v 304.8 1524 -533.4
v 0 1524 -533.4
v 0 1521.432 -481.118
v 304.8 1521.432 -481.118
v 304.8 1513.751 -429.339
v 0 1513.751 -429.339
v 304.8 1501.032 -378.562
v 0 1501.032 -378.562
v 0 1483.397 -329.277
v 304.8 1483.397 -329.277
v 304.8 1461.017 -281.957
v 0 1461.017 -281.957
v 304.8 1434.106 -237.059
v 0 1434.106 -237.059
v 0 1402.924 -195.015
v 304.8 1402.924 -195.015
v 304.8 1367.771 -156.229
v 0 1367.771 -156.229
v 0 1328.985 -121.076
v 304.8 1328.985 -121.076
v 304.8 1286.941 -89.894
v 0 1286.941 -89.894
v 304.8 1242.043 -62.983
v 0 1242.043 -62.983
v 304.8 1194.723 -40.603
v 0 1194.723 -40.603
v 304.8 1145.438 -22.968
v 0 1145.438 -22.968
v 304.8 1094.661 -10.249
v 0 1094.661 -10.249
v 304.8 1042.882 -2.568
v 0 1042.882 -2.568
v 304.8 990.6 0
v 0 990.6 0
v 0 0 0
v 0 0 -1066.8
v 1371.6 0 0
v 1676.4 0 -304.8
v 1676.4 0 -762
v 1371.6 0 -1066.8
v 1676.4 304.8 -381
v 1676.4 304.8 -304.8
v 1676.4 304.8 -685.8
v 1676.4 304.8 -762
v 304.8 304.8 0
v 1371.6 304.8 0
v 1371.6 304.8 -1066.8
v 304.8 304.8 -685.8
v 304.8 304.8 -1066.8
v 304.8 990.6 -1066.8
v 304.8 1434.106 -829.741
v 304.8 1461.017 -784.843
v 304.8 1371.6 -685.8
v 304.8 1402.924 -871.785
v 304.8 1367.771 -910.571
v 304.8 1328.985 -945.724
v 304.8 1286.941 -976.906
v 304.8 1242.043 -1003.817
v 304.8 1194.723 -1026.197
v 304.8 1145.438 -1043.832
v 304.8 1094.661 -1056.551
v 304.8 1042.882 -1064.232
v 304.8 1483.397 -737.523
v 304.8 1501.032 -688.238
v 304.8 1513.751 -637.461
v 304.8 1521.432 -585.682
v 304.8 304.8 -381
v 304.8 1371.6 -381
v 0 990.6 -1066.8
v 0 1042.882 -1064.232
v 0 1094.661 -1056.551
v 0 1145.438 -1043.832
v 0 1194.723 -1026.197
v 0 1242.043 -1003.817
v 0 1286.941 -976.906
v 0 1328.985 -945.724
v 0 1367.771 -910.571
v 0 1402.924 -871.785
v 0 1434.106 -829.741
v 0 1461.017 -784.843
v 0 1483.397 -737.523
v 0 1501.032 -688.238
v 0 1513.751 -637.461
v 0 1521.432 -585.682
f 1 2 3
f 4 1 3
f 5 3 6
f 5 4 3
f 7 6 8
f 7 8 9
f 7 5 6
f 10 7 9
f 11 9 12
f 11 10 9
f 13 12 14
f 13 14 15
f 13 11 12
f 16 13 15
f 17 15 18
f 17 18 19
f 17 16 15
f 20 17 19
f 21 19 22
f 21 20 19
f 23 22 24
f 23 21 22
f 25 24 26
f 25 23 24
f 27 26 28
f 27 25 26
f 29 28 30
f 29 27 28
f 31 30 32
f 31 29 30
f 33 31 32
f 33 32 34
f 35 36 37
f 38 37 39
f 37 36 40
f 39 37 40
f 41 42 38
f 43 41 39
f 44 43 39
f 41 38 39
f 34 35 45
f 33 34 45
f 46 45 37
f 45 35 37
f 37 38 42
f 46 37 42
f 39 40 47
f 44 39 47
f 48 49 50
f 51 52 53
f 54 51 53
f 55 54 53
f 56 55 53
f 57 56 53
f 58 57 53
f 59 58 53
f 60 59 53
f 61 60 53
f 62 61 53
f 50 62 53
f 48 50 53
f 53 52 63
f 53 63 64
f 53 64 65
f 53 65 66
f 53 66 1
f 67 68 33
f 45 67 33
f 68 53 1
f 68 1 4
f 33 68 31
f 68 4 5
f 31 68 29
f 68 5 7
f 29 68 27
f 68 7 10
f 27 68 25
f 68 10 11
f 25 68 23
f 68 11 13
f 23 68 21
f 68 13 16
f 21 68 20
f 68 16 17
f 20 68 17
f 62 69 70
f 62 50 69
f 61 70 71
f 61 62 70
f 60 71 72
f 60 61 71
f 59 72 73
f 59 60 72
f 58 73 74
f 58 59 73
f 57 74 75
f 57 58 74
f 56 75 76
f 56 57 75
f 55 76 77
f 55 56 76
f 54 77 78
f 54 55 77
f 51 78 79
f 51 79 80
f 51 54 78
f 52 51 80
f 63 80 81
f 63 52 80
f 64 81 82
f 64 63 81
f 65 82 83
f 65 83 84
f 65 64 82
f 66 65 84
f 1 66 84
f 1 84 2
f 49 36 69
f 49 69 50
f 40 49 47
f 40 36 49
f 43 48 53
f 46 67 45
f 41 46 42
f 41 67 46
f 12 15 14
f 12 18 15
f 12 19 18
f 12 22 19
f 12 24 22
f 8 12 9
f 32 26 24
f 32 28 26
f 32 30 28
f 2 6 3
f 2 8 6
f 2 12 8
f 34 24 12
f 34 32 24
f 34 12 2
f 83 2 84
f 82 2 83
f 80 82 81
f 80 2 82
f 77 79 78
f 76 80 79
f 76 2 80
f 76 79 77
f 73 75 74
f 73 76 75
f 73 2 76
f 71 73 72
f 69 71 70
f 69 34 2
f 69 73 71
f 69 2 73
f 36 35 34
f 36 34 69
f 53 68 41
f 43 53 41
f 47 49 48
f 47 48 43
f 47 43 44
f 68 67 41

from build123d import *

# Parameters (mm, degrees)
SKETCH1_W           = 1676.4
SKETCH1_H           = 1066.8
BOSS_EXTRUDE1_DEPTH = 304.8
SKETCH2_W           = 1066.8
SKETCH2_H           = 1524
BOSS_EXTRUDE2_DEPTH = 304.8
FILLET1_R           = 533.4
SKETCH5_W           = 1371.6
SKETCH5_H           = 304.8
BOSS_EXTRUDE3_DEPTH = 1066.8
CUT_EXTRUDE1_DEPTH  = 1066.8
CHAMFER1_SIZE       = 304.8


with BuildPart() as part:
    # Sketch1 → Boss-Extrude1 (new body)
    with BuildSketch(Plane(origin=(0, 0, 0), x_dir=(1, 0, 0), z_dir=(0, 1, 0))):
        with Locations((838.2, 533.4)):
            Rectangle(SKETCH1_W, SKETCH1_H)
    extrude(amount=BOSS_EXTRUDE1_DEPTH)

    # Sketch2 → Boss-Extrude2 (add)
    with BuildSketch(Plane.ZY):
        with Locations((-533.4, 762)):
            Rectangle(SKETCH2_W, SKETCH2_H)
    extrude(amount=-BOSS_EXTRUDE2_DEPTH)

    # Fillet1
    fillet1_edges = [part.edges().sort_by_distance(p)[0] for p in [
        (152.4, 1524, -1066.8),
        (152.4, 1524, 0),
    ]]
    fillet(fillet1_edges, radius=FILLET1_R - 0.0001)  # a hair under: the kernel refuses the full size

    # Sketch5 → Boss-Extrude3 (add)
    with BuildSketch(Plane(origin=(0, 304.8, 0), x_dir=(1, 0, 0), z_dir=(0, 1, 0))):
        with Locations((990.6, 533.4)):
            Rectangle(SKETCH5_W, SKETCH5_H)
    extrude(amount=BOSS_EXTRUDE3_DEPTH)

    # Sketch6 → Cut-Extrude1 (cut)
    with BuildSketch(Plane.XY.offset(-381)):
        Polygon((304.8, 1371.6), (1676.4, 304.8), (1676.4, 1371.6), align=None)
    extrude(amount=-CUT_EXTRUDE1_DEPTH, mode=Mode.SUBTRACT)

    # Chamfer1
    chamfer1_edges = [part.edges().sort_by_distance(p)[0] for p in [
        (1676.4, 152.4, -1066.8),
        (1676.4, 152.4, 0),
    ]]
    chamfer(chamfer1_edges, length=CHAMFER1_SIZE)


solid = part.part
